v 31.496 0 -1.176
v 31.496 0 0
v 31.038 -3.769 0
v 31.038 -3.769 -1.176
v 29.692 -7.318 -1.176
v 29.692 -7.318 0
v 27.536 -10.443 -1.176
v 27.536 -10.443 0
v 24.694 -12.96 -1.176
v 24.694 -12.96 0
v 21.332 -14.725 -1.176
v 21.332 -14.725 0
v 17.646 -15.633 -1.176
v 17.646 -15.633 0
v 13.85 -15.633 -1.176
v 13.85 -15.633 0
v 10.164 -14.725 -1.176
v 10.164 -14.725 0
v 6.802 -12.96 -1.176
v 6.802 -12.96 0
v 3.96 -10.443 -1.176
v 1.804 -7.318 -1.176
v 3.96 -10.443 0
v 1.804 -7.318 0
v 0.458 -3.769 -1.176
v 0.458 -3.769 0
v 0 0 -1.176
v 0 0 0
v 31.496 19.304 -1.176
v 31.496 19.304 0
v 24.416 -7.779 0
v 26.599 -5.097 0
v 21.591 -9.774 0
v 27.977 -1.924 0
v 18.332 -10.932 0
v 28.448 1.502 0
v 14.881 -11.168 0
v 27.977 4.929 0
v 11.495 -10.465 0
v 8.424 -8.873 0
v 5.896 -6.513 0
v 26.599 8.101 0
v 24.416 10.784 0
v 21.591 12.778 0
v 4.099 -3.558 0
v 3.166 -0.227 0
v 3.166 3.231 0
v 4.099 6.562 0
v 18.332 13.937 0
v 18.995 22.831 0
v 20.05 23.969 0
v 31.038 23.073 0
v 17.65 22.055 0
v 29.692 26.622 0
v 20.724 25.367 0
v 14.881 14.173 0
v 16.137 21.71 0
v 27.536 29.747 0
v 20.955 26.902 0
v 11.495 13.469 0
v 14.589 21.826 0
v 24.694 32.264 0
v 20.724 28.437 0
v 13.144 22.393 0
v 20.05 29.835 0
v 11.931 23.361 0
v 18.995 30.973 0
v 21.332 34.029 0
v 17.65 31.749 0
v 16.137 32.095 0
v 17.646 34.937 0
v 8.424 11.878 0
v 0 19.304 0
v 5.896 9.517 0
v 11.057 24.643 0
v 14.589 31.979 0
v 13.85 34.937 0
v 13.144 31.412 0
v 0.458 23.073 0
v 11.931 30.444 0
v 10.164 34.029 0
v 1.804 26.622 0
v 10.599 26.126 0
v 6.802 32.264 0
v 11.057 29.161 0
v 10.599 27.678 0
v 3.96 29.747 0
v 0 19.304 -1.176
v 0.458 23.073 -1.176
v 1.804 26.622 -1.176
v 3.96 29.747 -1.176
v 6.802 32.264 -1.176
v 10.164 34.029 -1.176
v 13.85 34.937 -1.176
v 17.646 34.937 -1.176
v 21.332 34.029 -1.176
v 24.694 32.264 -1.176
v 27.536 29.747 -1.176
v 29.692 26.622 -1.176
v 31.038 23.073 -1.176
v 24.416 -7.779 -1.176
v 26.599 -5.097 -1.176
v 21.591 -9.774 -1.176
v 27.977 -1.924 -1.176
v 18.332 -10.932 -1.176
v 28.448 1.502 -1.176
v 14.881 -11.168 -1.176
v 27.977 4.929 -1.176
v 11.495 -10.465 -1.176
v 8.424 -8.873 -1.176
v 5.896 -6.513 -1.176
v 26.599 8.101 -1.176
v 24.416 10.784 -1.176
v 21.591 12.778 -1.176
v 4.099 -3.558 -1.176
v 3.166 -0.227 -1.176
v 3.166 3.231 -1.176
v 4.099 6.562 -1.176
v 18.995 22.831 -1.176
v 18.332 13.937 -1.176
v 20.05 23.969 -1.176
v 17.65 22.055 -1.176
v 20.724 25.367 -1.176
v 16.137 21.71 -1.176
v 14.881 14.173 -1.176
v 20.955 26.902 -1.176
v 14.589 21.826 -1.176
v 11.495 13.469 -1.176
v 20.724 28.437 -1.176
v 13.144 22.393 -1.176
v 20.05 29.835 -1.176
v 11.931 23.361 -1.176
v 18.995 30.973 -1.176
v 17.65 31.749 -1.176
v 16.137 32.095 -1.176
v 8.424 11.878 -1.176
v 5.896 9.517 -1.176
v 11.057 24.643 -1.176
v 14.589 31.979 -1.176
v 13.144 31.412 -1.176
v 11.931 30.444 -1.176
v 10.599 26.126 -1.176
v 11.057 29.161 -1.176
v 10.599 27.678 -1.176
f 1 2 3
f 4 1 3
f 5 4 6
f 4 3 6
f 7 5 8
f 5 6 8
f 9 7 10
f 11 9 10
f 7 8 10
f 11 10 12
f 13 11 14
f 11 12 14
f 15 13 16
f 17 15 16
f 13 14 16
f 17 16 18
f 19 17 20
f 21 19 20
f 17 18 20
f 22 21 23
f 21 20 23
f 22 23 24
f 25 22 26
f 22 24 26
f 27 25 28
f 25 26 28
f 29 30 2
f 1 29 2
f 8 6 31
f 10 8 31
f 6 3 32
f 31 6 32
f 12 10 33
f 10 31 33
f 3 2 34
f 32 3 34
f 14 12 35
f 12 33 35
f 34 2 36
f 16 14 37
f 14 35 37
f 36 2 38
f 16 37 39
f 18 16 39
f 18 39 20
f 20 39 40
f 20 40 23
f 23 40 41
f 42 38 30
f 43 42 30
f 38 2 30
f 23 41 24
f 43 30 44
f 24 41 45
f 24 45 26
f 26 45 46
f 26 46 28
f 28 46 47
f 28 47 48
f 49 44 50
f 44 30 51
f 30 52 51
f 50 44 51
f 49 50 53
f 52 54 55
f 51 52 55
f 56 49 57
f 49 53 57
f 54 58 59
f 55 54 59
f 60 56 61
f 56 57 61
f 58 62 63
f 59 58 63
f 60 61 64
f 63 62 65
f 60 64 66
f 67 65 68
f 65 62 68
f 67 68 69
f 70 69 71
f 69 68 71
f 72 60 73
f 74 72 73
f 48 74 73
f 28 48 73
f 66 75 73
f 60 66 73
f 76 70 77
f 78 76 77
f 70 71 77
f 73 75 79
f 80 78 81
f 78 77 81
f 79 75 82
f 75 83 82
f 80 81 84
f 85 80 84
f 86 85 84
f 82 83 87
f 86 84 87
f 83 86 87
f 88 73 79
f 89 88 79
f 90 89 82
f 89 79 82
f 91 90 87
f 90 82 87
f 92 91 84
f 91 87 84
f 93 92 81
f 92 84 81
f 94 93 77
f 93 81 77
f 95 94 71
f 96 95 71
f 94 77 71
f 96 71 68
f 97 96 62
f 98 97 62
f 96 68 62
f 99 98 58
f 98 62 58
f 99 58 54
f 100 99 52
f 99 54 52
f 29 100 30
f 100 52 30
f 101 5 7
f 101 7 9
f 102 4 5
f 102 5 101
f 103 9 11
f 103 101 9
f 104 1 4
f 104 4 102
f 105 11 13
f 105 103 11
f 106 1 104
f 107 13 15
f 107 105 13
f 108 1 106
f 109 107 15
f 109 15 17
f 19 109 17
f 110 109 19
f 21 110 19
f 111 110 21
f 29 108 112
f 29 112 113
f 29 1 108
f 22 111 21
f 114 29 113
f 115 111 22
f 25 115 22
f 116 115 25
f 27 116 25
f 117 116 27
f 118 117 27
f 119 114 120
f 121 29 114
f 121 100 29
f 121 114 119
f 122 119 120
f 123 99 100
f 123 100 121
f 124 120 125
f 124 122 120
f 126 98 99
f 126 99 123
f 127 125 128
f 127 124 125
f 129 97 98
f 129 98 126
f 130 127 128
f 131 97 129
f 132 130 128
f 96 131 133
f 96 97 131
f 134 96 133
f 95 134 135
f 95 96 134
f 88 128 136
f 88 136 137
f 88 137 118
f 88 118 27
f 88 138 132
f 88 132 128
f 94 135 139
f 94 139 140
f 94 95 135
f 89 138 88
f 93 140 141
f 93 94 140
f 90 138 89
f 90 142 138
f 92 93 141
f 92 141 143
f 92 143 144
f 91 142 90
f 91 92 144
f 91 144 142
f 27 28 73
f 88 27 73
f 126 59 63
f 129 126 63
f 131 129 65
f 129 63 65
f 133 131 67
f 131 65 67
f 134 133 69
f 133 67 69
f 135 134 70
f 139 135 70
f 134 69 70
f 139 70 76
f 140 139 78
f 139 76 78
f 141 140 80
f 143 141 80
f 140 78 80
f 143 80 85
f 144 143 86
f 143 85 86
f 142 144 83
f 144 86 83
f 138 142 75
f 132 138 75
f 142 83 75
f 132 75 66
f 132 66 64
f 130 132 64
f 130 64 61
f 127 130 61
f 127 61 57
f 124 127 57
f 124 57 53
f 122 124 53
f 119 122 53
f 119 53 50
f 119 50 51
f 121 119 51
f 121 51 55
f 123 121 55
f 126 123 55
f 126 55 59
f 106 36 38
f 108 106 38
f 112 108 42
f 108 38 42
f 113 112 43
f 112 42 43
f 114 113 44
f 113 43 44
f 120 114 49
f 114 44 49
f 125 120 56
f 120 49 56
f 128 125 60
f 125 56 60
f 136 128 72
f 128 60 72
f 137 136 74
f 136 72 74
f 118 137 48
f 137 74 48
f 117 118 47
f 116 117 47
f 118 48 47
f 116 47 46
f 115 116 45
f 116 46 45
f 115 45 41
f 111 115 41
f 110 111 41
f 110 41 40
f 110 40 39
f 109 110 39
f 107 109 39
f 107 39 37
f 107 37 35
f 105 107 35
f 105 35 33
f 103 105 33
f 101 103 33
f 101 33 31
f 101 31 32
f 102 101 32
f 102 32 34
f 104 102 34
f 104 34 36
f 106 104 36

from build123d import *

# Parameters (mm, degrees)
FASTENER_BODY_DEPTH = 1.17602
CUT_EXTRUDE2_REACH  = 49.138
SKETCH3_R           = 5.207
SKETCH3_R_2         = 12.7


with BuildPart() as part:
    # Sketch2 → Fastener Body (new body)
    with BuildSketch(Plane.XY):
        with BuildLine():
            Line((0, 0), (0, 19.304))
            ThreePointArc((0, 19.304), (15.748, 35.052), (31.496, 19.304))
            Line((31.496, 19.304), (31.496, 0))
            ThreePointArc((31.496, 0), (15.748, -15.748), (0, 0))
        make_face()
    extrude(amount=-FASTENER_BODY_DEPTH)

    # Sketch3 → Cut-Extrude2 (cut, up to next)
    with BuildSketch(Plane.XY, mode=Mode.PRIVATE) as cut_extrude2_sk1:
        with Locations((15.748, 26.902177492)):
            Circle(SKETCH3_R)
    cut_extrude2_tool1 = extrude(cut_extrude2_sk1.sketch, amount=-CUT_EXTRUDE2_REACH, mode=Mode.PRIVATE) & part.part
    # Sketch3 → Cut-Extrude2 (cut, up to next)
    with BuildSketch(Plane.XY, mode=Mode.PRIVATE) as cut_extrude2_sk2:
        with Locations((15.748, 1.502177492)):
            Circle(SKETCH3_R_2)
    cut_extrude2_tool2 = extrude(cut_extrude2_sk2.sketch, amount=-CUT_EXTRUDE2_REACH, mode=Mode.PRIVATE) & part.part
    add(cut_extrude2_tool1.solids().sort_by_distance((15.748, 26.902177, 0))[0], mode=Mode.SUBTRACT)
    add(cut_extrude2_tool2.solids().sort_by_distance((15.748, 1.502177, 0))[0], mode=Mode.SUBTRACT)


solid = part.part
